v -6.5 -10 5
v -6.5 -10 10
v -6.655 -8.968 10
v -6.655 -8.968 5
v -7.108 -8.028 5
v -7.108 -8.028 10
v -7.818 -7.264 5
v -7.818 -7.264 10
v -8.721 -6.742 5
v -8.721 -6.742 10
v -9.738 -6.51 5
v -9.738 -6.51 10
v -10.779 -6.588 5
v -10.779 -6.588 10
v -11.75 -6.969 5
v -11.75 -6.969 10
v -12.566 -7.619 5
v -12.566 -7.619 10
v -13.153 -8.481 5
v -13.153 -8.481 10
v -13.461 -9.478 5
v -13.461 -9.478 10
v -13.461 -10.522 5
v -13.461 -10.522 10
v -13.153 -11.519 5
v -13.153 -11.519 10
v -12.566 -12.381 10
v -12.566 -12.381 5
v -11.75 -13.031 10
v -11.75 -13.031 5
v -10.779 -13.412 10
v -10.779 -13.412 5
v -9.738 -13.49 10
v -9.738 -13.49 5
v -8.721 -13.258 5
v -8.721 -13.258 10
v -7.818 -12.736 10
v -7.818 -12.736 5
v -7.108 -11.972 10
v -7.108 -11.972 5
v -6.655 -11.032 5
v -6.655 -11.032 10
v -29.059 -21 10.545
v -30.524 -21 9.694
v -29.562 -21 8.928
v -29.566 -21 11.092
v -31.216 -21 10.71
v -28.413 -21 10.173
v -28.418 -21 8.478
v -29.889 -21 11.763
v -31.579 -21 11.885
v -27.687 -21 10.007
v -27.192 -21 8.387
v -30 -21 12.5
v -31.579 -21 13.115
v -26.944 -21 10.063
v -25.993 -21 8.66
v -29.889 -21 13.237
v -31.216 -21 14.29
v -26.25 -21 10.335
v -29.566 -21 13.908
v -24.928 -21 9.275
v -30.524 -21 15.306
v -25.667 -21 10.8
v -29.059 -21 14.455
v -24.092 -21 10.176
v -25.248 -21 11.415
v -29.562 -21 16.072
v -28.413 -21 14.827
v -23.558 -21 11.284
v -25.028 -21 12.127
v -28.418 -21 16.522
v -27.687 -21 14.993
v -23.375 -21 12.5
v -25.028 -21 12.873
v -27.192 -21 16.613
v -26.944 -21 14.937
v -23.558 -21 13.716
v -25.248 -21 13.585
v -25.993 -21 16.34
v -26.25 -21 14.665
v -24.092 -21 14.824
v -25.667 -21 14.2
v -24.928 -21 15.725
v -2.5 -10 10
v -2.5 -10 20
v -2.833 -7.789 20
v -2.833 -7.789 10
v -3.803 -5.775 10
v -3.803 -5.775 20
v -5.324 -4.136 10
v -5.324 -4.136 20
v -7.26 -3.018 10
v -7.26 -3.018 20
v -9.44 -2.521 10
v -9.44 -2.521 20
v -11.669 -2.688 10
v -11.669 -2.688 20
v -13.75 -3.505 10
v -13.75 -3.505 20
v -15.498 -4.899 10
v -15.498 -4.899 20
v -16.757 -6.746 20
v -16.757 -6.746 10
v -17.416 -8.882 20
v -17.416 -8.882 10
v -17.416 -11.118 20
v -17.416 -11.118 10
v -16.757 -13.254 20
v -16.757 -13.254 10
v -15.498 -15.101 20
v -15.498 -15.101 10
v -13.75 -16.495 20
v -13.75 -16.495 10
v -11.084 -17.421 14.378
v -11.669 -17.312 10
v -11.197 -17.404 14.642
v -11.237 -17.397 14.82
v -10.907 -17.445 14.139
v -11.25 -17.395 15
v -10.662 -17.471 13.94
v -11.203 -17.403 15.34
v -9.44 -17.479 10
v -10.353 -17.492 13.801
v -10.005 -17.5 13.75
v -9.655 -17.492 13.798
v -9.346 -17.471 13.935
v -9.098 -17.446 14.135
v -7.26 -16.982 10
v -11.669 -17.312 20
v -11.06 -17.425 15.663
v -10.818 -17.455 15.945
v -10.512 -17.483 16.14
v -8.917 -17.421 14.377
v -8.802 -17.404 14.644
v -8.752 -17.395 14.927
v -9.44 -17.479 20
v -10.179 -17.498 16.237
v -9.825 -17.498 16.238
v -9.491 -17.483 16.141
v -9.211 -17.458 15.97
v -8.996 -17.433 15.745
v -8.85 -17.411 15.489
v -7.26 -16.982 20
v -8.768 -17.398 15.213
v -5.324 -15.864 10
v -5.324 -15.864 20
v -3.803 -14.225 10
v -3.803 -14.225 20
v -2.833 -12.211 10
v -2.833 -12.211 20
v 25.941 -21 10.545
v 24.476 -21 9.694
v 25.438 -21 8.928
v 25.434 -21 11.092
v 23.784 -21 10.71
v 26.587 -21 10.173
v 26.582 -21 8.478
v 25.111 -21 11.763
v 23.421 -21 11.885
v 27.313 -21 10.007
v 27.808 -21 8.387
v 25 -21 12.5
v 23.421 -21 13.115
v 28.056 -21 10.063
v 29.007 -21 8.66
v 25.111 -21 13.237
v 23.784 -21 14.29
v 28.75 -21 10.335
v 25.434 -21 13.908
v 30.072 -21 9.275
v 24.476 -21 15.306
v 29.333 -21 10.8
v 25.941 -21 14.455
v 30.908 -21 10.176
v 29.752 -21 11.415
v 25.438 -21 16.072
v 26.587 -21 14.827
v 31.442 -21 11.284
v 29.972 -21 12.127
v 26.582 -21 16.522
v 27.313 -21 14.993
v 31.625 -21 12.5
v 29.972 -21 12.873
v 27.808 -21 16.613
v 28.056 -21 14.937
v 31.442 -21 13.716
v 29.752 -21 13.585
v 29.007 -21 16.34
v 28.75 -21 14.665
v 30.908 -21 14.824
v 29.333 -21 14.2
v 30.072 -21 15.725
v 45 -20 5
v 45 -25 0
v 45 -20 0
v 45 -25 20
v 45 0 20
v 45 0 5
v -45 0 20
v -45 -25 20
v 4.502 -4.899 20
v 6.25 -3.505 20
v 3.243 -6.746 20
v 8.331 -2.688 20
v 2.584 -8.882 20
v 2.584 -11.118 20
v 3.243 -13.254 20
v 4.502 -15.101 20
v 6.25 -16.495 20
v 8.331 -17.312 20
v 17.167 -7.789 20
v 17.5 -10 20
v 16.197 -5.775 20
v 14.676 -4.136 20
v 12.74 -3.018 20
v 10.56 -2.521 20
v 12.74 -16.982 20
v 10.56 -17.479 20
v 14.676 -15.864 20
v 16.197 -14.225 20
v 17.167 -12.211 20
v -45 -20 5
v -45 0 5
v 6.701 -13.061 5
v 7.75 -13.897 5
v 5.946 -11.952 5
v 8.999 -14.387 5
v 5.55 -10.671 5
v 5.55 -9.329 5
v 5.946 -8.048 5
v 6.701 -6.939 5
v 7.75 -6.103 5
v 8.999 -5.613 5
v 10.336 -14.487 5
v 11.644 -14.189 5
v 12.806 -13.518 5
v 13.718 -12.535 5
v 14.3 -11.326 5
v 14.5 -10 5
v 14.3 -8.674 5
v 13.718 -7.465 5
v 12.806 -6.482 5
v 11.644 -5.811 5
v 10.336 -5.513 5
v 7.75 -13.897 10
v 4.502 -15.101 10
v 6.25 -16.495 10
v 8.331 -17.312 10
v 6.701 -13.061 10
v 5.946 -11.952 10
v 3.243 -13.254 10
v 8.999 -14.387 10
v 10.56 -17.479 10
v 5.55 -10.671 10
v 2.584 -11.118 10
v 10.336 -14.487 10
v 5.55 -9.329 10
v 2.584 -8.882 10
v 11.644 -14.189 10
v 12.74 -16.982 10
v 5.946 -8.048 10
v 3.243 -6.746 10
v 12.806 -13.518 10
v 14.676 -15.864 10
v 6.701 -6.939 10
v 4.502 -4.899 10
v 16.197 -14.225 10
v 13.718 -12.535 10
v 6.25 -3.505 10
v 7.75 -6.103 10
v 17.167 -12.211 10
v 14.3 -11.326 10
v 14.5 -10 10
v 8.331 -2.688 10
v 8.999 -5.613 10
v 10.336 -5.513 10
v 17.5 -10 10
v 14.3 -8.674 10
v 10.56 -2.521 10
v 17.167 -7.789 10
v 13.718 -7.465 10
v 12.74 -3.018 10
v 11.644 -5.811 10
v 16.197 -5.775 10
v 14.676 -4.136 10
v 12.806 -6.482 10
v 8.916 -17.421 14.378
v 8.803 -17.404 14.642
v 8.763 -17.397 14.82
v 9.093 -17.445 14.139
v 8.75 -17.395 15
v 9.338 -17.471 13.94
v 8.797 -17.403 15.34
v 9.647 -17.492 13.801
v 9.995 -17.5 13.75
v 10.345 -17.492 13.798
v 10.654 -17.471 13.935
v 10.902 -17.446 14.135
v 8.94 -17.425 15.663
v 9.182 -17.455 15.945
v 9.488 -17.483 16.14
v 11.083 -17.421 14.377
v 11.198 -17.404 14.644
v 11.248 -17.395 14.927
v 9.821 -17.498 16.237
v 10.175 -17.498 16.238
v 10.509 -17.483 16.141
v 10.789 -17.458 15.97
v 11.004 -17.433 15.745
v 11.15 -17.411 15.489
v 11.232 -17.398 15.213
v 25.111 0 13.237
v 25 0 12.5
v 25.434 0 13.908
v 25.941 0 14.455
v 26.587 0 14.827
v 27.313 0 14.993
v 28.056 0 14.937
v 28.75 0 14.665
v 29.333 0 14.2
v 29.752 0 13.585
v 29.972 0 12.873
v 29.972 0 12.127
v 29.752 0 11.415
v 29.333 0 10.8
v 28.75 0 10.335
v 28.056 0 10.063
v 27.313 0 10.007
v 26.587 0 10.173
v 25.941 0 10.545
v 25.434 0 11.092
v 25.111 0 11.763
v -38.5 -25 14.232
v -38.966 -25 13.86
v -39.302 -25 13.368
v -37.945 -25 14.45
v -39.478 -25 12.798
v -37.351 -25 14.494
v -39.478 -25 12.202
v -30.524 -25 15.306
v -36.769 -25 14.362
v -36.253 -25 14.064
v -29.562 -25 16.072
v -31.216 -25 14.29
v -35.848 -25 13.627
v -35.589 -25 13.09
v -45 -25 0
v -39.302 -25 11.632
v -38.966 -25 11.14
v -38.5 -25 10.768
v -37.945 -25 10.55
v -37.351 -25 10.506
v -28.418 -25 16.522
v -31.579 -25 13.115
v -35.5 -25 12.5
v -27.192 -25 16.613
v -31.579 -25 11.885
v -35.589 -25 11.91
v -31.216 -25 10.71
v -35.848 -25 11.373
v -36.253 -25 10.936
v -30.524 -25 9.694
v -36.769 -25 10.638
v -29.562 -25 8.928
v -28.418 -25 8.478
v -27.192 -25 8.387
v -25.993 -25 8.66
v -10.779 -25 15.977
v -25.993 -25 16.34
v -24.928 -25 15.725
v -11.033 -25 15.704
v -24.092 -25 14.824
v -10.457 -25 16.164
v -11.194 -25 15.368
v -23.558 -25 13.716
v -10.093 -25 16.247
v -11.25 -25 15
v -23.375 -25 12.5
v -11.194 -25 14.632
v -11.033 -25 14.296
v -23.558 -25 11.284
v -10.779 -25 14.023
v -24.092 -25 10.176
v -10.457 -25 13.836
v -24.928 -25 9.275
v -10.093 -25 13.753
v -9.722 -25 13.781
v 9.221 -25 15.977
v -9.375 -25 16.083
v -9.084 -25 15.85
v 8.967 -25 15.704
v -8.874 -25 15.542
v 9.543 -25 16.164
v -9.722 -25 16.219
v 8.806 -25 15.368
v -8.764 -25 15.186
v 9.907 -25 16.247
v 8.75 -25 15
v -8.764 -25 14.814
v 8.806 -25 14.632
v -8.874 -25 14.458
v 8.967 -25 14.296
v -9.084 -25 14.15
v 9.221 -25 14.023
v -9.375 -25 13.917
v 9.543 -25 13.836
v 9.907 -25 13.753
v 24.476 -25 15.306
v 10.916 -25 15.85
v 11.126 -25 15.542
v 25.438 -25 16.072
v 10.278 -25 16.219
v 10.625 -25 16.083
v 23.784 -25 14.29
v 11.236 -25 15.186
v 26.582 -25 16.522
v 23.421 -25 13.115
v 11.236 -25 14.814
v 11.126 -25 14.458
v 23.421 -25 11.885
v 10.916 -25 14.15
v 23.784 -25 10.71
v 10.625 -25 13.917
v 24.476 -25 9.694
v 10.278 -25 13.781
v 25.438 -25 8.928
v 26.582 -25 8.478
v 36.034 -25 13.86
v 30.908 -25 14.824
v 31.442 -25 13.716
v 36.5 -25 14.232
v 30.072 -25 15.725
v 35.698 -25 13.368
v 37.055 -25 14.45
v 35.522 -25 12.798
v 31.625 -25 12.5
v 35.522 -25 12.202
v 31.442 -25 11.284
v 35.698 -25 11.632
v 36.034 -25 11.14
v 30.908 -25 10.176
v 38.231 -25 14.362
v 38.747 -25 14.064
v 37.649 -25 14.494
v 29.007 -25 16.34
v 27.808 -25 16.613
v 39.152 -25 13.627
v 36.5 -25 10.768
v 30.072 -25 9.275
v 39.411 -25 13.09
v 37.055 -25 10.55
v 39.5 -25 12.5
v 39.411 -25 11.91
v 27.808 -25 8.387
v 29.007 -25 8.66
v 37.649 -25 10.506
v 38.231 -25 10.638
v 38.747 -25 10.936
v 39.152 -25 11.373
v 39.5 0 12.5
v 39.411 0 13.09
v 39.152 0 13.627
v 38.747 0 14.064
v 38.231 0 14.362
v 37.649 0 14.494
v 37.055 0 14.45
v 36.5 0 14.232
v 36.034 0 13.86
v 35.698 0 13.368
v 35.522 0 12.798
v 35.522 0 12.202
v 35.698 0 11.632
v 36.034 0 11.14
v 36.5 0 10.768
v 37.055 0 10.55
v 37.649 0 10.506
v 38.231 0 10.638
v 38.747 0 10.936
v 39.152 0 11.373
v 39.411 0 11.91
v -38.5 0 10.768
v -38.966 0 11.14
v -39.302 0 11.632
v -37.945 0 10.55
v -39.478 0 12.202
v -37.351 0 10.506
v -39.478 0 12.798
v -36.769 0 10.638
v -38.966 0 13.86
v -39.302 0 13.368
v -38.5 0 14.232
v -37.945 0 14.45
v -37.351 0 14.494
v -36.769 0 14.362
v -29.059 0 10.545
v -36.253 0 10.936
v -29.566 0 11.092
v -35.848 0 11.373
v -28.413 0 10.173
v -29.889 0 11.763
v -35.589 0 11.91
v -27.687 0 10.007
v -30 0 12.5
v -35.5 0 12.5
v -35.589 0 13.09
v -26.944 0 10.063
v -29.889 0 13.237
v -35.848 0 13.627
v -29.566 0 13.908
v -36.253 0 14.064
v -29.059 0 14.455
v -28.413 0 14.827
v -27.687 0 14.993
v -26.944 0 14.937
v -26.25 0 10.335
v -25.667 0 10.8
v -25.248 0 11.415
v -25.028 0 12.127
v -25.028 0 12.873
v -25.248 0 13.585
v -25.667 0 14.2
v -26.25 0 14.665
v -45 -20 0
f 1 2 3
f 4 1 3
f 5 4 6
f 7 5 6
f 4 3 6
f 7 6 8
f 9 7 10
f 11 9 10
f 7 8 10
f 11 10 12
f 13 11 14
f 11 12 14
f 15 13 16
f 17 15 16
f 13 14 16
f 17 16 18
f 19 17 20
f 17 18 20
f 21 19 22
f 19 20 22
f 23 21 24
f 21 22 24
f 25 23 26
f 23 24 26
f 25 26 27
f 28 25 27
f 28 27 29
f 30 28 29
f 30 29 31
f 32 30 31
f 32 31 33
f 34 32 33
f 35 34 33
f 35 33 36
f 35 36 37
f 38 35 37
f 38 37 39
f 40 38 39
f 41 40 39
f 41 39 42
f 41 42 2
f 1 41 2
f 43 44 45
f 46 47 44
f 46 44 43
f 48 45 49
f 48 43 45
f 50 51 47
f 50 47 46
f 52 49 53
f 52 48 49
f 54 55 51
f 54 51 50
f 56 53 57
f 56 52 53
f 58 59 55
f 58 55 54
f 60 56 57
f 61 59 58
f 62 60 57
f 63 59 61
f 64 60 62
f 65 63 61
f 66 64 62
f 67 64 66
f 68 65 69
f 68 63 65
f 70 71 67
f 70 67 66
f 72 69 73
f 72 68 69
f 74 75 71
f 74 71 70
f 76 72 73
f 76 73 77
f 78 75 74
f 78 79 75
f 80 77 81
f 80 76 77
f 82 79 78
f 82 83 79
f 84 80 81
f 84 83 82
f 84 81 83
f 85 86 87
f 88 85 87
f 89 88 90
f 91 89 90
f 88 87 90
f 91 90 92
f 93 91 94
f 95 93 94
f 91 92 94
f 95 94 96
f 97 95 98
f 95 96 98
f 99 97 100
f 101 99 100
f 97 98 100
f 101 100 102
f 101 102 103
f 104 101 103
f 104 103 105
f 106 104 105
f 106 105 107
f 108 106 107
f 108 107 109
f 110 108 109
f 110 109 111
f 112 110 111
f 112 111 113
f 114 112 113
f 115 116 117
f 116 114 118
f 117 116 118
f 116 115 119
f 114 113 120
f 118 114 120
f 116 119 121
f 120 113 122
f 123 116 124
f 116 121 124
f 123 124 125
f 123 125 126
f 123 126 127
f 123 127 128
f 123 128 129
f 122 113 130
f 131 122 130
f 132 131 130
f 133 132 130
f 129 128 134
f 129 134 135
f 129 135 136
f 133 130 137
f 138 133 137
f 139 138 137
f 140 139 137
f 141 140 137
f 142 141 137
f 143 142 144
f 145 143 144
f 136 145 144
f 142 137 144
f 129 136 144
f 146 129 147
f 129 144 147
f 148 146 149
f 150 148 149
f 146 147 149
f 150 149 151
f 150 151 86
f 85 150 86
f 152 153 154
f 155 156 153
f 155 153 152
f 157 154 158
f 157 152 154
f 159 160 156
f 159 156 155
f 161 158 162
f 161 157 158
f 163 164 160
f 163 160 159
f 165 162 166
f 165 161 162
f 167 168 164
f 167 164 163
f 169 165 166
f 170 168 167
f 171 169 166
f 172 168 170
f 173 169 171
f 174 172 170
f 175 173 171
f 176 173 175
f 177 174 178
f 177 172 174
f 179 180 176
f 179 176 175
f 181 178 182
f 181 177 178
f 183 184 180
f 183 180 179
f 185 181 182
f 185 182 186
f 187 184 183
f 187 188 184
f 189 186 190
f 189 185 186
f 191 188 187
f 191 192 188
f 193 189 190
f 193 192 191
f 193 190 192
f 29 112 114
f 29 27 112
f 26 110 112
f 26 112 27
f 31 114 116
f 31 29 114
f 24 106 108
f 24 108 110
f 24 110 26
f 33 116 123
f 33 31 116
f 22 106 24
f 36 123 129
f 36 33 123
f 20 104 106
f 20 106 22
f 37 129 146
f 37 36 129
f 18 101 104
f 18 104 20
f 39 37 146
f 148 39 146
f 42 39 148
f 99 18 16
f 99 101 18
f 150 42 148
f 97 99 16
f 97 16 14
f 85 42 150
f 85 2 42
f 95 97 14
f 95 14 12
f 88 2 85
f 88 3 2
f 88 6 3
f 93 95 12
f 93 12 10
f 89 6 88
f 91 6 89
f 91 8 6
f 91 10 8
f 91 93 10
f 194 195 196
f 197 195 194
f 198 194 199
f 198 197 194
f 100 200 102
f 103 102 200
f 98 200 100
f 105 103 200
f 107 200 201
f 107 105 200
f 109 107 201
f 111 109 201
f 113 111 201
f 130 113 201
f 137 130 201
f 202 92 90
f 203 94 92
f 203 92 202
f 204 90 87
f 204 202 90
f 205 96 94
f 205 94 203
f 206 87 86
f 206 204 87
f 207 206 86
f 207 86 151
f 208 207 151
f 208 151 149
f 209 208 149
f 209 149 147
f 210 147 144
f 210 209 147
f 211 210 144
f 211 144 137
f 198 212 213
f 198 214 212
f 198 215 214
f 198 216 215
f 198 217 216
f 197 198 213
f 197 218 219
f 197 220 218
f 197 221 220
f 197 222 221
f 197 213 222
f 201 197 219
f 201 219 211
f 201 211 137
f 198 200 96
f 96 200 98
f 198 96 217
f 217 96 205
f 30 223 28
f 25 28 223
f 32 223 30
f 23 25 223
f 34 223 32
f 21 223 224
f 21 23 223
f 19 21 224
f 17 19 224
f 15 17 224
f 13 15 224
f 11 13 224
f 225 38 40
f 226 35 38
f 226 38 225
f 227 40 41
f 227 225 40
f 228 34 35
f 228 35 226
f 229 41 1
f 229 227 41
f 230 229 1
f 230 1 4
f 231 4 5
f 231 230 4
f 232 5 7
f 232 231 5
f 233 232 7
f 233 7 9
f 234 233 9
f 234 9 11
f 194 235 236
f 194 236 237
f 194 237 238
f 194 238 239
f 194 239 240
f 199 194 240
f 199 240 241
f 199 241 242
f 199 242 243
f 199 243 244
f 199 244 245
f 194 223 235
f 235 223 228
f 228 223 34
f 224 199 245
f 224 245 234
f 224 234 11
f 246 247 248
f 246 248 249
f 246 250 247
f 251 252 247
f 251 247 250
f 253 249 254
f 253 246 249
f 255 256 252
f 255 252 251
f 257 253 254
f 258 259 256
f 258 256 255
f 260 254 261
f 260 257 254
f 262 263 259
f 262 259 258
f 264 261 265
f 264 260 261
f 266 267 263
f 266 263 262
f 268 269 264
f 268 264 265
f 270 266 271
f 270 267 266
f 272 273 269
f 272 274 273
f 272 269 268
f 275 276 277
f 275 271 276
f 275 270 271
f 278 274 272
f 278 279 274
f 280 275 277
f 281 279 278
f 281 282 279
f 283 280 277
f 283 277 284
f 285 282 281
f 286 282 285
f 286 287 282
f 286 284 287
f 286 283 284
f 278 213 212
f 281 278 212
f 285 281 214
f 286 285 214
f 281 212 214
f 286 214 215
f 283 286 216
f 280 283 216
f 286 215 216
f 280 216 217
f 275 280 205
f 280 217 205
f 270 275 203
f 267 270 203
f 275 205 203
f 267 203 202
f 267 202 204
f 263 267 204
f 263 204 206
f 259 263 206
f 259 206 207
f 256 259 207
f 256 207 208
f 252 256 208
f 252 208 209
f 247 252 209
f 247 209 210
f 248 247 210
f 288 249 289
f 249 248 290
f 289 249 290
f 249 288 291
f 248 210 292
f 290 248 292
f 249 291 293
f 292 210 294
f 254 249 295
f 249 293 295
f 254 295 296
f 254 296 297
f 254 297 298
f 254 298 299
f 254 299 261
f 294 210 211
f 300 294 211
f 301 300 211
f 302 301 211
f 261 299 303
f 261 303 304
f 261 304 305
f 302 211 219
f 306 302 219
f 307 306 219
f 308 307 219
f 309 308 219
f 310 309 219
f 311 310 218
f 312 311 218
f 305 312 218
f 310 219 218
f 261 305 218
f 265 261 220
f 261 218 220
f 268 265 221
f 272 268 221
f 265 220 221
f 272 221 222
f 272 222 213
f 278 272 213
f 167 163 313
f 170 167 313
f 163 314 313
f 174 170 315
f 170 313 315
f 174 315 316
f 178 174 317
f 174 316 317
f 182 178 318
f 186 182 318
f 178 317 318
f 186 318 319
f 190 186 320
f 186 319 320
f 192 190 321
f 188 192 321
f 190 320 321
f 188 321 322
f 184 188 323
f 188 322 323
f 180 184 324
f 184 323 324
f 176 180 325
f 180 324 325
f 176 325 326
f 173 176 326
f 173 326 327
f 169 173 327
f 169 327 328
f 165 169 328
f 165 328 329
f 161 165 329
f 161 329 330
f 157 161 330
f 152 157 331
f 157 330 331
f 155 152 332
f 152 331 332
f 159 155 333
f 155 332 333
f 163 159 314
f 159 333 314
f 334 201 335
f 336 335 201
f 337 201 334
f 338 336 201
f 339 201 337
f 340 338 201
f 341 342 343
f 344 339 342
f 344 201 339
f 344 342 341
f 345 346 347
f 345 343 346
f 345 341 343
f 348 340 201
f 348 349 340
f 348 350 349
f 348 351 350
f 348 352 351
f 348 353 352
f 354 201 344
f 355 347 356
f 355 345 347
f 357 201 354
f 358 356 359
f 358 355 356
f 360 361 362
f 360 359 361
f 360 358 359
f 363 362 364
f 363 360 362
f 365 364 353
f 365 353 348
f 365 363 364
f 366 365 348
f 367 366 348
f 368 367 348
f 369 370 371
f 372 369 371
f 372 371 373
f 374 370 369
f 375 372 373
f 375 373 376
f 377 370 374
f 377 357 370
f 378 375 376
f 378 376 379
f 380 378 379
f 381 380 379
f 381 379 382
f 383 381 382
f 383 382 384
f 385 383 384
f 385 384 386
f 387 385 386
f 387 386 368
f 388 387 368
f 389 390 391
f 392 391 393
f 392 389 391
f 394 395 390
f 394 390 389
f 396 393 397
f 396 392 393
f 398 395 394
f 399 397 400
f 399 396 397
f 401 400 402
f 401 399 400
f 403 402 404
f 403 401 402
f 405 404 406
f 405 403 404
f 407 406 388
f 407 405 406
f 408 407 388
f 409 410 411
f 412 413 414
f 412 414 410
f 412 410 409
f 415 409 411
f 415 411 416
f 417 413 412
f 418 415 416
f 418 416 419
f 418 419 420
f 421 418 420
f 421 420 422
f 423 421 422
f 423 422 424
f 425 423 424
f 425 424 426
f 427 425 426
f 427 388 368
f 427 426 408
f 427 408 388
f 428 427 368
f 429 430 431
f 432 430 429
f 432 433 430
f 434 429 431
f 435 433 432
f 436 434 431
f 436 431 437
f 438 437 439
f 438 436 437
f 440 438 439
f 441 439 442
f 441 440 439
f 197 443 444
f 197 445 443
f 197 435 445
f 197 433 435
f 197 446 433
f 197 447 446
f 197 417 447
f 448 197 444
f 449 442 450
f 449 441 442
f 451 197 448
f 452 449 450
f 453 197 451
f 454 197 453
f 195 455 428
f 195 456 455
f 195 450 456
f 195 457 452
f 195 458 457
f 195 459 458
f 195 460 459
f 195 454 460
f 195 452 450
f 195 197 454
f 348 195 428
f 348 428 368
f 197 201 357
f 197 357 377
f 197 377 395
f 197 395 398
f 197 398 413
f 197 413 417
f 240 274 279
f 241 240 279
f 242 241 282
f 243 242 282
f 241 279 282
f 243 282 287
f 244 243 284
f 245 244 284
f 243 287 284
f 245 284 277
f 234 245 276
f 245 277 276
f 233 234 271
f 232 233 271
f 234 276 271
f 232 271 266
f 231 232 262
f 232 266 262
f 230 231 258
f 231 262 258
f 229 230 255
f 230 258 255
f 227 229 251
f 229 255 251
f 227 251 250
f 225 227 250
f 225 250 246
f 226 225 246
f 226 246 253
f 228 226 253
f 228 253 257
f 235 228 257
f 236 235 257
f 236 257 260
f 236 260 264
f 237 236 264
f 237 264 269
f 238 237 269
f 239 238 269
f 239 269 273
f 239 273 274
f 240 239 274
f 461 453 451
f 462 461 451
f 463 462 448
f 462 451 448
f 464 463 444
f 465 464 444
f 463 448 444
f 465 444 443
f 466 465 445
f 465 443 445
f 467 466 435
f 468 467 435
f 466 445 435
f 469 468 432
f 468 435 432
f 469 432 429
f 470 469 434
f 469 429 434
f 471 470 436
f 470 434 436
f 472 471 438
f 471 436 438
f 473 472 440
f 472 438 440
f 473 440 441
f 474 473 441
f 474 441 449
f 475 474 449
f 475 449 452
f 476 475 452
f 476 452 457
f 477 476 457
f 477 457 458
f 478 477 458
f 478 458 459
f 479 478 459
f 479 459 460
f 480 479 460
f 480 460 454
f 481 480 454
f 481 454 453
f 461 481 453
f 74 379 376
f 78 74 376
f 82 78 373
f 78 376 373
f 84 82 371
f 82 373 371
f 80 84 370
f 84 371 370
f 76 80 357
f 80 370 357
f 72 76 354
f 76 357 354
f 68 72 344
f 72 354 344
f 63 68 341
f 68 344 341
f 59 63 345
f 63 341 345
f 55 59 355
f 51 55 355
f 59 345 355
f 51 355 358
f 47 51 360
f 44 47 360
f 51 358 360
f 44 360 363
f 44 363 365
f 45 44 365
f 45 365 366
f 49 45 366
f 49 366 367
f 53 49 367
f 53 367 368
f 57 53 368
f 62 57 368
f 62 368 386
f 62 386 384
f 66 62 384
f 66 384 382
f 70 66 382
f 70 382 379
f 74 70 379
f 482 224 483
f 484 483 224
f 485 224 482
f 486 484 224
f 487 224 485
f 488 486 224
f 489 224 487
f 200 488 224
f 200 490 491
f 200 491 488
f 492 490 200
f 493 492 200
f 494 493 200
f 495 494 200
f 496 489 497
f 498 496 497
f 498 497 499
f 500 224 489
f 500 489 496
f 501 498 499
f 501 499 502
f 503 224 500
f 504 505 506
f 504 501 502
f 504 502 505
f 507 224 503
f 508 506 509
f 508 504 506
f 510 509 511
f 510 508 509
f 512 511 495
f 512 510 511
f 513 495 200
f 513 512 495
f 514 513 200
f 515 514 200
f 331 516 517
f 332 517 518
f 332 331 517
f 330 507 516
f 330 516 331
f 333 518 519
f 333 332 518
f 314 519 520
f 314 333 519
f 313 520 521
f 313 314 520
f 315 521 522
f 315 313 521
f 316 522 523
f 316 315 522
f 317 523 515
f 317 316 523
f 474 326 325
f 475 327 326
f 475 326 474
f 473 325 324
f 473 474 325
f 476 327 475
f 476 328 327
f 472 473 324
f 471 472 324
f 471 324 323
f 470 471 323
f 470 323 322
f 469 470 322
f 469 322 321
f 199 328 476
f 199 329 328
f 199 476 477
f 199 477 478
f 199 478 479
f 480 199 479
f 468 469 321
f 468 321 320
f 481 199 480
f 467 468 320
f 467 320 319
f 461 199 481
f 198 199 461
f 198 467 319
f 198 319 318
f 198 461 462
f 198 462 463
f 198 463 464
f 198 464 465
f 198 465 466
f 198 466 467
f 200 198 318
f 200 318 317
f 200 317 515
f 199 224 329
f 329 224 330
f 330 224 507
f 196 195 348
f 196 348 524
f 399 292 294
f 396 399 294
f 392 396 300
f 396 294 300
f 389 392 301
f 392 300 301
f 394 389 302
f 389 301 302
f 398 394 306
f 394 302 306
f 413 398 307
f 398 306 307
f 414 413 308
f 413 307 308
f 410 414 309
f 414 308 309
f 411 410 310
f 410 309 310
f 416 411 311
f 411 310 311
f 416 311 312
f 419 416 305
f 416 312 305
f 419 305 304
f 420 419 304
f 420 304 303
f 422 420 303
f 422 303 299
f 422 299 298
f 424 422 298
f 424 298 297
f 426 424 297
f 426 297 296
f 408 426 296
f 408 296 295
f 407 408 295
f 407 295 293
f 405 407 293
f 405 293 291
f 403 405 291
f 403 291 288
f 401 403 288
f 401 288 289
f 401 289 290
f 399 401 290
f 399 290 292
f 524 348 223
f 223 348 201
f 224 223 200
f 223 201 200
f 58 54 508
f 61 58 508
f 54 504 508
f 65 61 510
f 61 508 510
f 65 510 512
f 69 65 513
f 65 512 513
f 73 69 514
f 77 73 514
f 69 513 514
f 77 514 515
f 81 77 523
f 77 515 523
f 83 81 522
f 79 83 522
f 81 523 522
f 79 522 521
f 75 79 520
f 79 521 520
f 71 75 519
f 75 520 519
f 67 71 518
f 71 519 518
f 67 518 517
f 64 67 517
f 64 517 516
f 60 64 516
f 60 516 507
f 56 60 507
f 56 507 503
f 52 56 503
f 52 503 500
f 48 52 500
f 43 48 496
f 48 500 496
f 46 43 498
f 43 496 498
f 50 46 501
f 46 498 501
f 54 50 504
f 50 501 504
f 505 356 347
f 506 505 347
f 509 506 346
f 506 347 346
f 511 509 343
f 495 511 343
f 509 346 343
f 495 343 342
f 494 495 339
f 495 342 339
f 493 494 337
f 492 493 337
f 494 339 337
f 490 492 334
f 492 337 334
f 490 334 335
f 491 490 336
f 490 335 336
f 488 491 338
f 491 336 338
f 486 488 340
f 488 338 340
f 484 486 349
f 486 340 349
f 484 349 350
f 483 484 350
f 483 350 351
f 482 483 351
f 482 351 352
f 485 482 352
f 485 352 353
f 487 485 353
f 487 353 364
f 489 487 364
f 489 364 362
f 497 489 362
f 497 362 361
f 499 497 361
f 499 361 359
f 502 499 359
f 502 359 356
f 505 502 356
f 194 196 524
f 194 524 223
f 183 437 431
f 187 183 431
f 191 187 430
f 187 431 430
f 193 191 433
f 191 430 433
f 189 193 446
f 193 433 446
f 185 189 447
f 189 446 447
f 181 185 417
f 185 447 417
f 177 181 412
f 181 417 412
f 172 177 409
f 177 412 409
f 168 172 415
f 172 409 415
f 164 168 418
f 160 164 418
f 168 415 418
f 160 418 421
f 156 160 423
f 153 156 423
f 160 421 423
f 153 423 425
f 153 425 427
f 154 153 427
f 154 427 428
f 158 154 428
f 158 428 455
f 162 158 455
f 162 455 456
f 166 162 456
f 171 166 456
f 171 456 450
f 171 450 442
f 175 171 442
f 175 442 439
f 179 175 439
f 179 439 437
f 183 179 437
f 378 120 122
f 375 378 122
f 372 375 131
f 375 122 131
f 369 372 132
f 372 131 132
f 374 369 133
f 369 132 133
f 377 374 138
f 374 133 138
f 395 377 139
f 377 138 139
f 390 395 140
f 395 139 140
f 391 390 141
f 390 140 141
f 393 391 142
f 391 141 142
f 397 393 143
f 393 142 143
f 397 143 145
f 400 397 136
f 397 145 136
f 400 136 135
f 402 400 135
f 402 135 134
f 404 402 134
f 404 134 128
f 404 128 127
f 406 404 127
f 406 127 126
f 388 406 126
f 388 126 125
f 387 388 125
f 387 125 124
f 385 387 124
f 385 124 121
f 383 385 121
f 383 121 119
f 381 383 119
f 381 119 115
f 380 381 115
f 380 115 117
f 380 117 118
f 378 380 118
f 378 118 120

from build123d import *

# Parameters (mm, degrees)
F1_DEPTH       = 45
F2_R           = 2
F3_DEPTH       = 25.001
F4_D           = 5
F4_CBORE_D     = 8.25
F4_CBORE_DEPTH = 4
F5_R           = 3.5
F5_R_2         = 4.5
F6_DEPTH       = 20.001
F5_R_3         = 7.5
F7_DEPTH       = 10
F9_D           = 2.5
F9_DEPTH       = 12.4
F9_TIP         = 0.7510757738


with BuildPart() as f1:
    # F0 (on Right) → F1 (new body, symmetric)
    with BuildSketch(Plane.YZ):
        Polygon((-25, 20), (-25, 0), (-20, 0), (-20, 5), (0, 5), (0, 20), align=None)
    extrude(amount=F1_DEPTH, both=True)

    # F2 (on face) → F3 (cut, through all)
    with BuildSketch(Plane.XZ.offset(25)):
        with Locations((-37.5, 12.5)):
            Circle(F2_R)
        with Locations((37.5, 12.5)):
            Circle(F2_R)
    extrude(amount=-F3_DEPTH, mode=Mode.SUBTRACT)

    # F4 (through all)
    with Locations(Plane.XZ.offset(25)):
        with Locations((-27.5, 12.5), (27.5, 12.5)):
            CounterBoreHole(F4_D / 2, F4_CBORE_D / 2, F4_CBORE_DEPTH)

    # F5 (on face) → F6 (cut, through all)
    with BuildSketch(Plane.XY.offset(20)):
        with Locations((-10, -10)):
            Circle(F5_R)
        with Locations((10, -10)):
            Circle(F5_R_2)
    extrude(amount=-F6_DEPTH, mode=Mode.SUBTRACT)

    # F5 (on face) → F7 (cut)
    with BuildSketch(Plane.XY.offset(20)):
        with Locations((-10, -10)):
            Circle(F5_R_3)
        with Locations((-10, -10)):
            Circle(F5_R, mode=Mode.SUBTRACT)
        with Locations((10, -10)):
            Circle(F5_R_3)
        with Locations((10, -10)):
            Circle(F5_R_2, mode=Mode.SUBTRACT)
    extrude(amount=-F7_DEPTH, mode=Mode.SUBTRACT)

    # F9
    with Locations(Plane.XZ.offset(25)):
        with Locations((-10, 15), (10, 15)):
            Hole(F9_D / 2, depth=F9_DEPTH)
            with Locations((0, 0, -(F9_DEPTH + F9_TIP / 2))):  # 118° drill point
                Cone(0, F9_D / 2, F9_TIP, mode=Mode.SUBTRACT)


solid = f1.part
